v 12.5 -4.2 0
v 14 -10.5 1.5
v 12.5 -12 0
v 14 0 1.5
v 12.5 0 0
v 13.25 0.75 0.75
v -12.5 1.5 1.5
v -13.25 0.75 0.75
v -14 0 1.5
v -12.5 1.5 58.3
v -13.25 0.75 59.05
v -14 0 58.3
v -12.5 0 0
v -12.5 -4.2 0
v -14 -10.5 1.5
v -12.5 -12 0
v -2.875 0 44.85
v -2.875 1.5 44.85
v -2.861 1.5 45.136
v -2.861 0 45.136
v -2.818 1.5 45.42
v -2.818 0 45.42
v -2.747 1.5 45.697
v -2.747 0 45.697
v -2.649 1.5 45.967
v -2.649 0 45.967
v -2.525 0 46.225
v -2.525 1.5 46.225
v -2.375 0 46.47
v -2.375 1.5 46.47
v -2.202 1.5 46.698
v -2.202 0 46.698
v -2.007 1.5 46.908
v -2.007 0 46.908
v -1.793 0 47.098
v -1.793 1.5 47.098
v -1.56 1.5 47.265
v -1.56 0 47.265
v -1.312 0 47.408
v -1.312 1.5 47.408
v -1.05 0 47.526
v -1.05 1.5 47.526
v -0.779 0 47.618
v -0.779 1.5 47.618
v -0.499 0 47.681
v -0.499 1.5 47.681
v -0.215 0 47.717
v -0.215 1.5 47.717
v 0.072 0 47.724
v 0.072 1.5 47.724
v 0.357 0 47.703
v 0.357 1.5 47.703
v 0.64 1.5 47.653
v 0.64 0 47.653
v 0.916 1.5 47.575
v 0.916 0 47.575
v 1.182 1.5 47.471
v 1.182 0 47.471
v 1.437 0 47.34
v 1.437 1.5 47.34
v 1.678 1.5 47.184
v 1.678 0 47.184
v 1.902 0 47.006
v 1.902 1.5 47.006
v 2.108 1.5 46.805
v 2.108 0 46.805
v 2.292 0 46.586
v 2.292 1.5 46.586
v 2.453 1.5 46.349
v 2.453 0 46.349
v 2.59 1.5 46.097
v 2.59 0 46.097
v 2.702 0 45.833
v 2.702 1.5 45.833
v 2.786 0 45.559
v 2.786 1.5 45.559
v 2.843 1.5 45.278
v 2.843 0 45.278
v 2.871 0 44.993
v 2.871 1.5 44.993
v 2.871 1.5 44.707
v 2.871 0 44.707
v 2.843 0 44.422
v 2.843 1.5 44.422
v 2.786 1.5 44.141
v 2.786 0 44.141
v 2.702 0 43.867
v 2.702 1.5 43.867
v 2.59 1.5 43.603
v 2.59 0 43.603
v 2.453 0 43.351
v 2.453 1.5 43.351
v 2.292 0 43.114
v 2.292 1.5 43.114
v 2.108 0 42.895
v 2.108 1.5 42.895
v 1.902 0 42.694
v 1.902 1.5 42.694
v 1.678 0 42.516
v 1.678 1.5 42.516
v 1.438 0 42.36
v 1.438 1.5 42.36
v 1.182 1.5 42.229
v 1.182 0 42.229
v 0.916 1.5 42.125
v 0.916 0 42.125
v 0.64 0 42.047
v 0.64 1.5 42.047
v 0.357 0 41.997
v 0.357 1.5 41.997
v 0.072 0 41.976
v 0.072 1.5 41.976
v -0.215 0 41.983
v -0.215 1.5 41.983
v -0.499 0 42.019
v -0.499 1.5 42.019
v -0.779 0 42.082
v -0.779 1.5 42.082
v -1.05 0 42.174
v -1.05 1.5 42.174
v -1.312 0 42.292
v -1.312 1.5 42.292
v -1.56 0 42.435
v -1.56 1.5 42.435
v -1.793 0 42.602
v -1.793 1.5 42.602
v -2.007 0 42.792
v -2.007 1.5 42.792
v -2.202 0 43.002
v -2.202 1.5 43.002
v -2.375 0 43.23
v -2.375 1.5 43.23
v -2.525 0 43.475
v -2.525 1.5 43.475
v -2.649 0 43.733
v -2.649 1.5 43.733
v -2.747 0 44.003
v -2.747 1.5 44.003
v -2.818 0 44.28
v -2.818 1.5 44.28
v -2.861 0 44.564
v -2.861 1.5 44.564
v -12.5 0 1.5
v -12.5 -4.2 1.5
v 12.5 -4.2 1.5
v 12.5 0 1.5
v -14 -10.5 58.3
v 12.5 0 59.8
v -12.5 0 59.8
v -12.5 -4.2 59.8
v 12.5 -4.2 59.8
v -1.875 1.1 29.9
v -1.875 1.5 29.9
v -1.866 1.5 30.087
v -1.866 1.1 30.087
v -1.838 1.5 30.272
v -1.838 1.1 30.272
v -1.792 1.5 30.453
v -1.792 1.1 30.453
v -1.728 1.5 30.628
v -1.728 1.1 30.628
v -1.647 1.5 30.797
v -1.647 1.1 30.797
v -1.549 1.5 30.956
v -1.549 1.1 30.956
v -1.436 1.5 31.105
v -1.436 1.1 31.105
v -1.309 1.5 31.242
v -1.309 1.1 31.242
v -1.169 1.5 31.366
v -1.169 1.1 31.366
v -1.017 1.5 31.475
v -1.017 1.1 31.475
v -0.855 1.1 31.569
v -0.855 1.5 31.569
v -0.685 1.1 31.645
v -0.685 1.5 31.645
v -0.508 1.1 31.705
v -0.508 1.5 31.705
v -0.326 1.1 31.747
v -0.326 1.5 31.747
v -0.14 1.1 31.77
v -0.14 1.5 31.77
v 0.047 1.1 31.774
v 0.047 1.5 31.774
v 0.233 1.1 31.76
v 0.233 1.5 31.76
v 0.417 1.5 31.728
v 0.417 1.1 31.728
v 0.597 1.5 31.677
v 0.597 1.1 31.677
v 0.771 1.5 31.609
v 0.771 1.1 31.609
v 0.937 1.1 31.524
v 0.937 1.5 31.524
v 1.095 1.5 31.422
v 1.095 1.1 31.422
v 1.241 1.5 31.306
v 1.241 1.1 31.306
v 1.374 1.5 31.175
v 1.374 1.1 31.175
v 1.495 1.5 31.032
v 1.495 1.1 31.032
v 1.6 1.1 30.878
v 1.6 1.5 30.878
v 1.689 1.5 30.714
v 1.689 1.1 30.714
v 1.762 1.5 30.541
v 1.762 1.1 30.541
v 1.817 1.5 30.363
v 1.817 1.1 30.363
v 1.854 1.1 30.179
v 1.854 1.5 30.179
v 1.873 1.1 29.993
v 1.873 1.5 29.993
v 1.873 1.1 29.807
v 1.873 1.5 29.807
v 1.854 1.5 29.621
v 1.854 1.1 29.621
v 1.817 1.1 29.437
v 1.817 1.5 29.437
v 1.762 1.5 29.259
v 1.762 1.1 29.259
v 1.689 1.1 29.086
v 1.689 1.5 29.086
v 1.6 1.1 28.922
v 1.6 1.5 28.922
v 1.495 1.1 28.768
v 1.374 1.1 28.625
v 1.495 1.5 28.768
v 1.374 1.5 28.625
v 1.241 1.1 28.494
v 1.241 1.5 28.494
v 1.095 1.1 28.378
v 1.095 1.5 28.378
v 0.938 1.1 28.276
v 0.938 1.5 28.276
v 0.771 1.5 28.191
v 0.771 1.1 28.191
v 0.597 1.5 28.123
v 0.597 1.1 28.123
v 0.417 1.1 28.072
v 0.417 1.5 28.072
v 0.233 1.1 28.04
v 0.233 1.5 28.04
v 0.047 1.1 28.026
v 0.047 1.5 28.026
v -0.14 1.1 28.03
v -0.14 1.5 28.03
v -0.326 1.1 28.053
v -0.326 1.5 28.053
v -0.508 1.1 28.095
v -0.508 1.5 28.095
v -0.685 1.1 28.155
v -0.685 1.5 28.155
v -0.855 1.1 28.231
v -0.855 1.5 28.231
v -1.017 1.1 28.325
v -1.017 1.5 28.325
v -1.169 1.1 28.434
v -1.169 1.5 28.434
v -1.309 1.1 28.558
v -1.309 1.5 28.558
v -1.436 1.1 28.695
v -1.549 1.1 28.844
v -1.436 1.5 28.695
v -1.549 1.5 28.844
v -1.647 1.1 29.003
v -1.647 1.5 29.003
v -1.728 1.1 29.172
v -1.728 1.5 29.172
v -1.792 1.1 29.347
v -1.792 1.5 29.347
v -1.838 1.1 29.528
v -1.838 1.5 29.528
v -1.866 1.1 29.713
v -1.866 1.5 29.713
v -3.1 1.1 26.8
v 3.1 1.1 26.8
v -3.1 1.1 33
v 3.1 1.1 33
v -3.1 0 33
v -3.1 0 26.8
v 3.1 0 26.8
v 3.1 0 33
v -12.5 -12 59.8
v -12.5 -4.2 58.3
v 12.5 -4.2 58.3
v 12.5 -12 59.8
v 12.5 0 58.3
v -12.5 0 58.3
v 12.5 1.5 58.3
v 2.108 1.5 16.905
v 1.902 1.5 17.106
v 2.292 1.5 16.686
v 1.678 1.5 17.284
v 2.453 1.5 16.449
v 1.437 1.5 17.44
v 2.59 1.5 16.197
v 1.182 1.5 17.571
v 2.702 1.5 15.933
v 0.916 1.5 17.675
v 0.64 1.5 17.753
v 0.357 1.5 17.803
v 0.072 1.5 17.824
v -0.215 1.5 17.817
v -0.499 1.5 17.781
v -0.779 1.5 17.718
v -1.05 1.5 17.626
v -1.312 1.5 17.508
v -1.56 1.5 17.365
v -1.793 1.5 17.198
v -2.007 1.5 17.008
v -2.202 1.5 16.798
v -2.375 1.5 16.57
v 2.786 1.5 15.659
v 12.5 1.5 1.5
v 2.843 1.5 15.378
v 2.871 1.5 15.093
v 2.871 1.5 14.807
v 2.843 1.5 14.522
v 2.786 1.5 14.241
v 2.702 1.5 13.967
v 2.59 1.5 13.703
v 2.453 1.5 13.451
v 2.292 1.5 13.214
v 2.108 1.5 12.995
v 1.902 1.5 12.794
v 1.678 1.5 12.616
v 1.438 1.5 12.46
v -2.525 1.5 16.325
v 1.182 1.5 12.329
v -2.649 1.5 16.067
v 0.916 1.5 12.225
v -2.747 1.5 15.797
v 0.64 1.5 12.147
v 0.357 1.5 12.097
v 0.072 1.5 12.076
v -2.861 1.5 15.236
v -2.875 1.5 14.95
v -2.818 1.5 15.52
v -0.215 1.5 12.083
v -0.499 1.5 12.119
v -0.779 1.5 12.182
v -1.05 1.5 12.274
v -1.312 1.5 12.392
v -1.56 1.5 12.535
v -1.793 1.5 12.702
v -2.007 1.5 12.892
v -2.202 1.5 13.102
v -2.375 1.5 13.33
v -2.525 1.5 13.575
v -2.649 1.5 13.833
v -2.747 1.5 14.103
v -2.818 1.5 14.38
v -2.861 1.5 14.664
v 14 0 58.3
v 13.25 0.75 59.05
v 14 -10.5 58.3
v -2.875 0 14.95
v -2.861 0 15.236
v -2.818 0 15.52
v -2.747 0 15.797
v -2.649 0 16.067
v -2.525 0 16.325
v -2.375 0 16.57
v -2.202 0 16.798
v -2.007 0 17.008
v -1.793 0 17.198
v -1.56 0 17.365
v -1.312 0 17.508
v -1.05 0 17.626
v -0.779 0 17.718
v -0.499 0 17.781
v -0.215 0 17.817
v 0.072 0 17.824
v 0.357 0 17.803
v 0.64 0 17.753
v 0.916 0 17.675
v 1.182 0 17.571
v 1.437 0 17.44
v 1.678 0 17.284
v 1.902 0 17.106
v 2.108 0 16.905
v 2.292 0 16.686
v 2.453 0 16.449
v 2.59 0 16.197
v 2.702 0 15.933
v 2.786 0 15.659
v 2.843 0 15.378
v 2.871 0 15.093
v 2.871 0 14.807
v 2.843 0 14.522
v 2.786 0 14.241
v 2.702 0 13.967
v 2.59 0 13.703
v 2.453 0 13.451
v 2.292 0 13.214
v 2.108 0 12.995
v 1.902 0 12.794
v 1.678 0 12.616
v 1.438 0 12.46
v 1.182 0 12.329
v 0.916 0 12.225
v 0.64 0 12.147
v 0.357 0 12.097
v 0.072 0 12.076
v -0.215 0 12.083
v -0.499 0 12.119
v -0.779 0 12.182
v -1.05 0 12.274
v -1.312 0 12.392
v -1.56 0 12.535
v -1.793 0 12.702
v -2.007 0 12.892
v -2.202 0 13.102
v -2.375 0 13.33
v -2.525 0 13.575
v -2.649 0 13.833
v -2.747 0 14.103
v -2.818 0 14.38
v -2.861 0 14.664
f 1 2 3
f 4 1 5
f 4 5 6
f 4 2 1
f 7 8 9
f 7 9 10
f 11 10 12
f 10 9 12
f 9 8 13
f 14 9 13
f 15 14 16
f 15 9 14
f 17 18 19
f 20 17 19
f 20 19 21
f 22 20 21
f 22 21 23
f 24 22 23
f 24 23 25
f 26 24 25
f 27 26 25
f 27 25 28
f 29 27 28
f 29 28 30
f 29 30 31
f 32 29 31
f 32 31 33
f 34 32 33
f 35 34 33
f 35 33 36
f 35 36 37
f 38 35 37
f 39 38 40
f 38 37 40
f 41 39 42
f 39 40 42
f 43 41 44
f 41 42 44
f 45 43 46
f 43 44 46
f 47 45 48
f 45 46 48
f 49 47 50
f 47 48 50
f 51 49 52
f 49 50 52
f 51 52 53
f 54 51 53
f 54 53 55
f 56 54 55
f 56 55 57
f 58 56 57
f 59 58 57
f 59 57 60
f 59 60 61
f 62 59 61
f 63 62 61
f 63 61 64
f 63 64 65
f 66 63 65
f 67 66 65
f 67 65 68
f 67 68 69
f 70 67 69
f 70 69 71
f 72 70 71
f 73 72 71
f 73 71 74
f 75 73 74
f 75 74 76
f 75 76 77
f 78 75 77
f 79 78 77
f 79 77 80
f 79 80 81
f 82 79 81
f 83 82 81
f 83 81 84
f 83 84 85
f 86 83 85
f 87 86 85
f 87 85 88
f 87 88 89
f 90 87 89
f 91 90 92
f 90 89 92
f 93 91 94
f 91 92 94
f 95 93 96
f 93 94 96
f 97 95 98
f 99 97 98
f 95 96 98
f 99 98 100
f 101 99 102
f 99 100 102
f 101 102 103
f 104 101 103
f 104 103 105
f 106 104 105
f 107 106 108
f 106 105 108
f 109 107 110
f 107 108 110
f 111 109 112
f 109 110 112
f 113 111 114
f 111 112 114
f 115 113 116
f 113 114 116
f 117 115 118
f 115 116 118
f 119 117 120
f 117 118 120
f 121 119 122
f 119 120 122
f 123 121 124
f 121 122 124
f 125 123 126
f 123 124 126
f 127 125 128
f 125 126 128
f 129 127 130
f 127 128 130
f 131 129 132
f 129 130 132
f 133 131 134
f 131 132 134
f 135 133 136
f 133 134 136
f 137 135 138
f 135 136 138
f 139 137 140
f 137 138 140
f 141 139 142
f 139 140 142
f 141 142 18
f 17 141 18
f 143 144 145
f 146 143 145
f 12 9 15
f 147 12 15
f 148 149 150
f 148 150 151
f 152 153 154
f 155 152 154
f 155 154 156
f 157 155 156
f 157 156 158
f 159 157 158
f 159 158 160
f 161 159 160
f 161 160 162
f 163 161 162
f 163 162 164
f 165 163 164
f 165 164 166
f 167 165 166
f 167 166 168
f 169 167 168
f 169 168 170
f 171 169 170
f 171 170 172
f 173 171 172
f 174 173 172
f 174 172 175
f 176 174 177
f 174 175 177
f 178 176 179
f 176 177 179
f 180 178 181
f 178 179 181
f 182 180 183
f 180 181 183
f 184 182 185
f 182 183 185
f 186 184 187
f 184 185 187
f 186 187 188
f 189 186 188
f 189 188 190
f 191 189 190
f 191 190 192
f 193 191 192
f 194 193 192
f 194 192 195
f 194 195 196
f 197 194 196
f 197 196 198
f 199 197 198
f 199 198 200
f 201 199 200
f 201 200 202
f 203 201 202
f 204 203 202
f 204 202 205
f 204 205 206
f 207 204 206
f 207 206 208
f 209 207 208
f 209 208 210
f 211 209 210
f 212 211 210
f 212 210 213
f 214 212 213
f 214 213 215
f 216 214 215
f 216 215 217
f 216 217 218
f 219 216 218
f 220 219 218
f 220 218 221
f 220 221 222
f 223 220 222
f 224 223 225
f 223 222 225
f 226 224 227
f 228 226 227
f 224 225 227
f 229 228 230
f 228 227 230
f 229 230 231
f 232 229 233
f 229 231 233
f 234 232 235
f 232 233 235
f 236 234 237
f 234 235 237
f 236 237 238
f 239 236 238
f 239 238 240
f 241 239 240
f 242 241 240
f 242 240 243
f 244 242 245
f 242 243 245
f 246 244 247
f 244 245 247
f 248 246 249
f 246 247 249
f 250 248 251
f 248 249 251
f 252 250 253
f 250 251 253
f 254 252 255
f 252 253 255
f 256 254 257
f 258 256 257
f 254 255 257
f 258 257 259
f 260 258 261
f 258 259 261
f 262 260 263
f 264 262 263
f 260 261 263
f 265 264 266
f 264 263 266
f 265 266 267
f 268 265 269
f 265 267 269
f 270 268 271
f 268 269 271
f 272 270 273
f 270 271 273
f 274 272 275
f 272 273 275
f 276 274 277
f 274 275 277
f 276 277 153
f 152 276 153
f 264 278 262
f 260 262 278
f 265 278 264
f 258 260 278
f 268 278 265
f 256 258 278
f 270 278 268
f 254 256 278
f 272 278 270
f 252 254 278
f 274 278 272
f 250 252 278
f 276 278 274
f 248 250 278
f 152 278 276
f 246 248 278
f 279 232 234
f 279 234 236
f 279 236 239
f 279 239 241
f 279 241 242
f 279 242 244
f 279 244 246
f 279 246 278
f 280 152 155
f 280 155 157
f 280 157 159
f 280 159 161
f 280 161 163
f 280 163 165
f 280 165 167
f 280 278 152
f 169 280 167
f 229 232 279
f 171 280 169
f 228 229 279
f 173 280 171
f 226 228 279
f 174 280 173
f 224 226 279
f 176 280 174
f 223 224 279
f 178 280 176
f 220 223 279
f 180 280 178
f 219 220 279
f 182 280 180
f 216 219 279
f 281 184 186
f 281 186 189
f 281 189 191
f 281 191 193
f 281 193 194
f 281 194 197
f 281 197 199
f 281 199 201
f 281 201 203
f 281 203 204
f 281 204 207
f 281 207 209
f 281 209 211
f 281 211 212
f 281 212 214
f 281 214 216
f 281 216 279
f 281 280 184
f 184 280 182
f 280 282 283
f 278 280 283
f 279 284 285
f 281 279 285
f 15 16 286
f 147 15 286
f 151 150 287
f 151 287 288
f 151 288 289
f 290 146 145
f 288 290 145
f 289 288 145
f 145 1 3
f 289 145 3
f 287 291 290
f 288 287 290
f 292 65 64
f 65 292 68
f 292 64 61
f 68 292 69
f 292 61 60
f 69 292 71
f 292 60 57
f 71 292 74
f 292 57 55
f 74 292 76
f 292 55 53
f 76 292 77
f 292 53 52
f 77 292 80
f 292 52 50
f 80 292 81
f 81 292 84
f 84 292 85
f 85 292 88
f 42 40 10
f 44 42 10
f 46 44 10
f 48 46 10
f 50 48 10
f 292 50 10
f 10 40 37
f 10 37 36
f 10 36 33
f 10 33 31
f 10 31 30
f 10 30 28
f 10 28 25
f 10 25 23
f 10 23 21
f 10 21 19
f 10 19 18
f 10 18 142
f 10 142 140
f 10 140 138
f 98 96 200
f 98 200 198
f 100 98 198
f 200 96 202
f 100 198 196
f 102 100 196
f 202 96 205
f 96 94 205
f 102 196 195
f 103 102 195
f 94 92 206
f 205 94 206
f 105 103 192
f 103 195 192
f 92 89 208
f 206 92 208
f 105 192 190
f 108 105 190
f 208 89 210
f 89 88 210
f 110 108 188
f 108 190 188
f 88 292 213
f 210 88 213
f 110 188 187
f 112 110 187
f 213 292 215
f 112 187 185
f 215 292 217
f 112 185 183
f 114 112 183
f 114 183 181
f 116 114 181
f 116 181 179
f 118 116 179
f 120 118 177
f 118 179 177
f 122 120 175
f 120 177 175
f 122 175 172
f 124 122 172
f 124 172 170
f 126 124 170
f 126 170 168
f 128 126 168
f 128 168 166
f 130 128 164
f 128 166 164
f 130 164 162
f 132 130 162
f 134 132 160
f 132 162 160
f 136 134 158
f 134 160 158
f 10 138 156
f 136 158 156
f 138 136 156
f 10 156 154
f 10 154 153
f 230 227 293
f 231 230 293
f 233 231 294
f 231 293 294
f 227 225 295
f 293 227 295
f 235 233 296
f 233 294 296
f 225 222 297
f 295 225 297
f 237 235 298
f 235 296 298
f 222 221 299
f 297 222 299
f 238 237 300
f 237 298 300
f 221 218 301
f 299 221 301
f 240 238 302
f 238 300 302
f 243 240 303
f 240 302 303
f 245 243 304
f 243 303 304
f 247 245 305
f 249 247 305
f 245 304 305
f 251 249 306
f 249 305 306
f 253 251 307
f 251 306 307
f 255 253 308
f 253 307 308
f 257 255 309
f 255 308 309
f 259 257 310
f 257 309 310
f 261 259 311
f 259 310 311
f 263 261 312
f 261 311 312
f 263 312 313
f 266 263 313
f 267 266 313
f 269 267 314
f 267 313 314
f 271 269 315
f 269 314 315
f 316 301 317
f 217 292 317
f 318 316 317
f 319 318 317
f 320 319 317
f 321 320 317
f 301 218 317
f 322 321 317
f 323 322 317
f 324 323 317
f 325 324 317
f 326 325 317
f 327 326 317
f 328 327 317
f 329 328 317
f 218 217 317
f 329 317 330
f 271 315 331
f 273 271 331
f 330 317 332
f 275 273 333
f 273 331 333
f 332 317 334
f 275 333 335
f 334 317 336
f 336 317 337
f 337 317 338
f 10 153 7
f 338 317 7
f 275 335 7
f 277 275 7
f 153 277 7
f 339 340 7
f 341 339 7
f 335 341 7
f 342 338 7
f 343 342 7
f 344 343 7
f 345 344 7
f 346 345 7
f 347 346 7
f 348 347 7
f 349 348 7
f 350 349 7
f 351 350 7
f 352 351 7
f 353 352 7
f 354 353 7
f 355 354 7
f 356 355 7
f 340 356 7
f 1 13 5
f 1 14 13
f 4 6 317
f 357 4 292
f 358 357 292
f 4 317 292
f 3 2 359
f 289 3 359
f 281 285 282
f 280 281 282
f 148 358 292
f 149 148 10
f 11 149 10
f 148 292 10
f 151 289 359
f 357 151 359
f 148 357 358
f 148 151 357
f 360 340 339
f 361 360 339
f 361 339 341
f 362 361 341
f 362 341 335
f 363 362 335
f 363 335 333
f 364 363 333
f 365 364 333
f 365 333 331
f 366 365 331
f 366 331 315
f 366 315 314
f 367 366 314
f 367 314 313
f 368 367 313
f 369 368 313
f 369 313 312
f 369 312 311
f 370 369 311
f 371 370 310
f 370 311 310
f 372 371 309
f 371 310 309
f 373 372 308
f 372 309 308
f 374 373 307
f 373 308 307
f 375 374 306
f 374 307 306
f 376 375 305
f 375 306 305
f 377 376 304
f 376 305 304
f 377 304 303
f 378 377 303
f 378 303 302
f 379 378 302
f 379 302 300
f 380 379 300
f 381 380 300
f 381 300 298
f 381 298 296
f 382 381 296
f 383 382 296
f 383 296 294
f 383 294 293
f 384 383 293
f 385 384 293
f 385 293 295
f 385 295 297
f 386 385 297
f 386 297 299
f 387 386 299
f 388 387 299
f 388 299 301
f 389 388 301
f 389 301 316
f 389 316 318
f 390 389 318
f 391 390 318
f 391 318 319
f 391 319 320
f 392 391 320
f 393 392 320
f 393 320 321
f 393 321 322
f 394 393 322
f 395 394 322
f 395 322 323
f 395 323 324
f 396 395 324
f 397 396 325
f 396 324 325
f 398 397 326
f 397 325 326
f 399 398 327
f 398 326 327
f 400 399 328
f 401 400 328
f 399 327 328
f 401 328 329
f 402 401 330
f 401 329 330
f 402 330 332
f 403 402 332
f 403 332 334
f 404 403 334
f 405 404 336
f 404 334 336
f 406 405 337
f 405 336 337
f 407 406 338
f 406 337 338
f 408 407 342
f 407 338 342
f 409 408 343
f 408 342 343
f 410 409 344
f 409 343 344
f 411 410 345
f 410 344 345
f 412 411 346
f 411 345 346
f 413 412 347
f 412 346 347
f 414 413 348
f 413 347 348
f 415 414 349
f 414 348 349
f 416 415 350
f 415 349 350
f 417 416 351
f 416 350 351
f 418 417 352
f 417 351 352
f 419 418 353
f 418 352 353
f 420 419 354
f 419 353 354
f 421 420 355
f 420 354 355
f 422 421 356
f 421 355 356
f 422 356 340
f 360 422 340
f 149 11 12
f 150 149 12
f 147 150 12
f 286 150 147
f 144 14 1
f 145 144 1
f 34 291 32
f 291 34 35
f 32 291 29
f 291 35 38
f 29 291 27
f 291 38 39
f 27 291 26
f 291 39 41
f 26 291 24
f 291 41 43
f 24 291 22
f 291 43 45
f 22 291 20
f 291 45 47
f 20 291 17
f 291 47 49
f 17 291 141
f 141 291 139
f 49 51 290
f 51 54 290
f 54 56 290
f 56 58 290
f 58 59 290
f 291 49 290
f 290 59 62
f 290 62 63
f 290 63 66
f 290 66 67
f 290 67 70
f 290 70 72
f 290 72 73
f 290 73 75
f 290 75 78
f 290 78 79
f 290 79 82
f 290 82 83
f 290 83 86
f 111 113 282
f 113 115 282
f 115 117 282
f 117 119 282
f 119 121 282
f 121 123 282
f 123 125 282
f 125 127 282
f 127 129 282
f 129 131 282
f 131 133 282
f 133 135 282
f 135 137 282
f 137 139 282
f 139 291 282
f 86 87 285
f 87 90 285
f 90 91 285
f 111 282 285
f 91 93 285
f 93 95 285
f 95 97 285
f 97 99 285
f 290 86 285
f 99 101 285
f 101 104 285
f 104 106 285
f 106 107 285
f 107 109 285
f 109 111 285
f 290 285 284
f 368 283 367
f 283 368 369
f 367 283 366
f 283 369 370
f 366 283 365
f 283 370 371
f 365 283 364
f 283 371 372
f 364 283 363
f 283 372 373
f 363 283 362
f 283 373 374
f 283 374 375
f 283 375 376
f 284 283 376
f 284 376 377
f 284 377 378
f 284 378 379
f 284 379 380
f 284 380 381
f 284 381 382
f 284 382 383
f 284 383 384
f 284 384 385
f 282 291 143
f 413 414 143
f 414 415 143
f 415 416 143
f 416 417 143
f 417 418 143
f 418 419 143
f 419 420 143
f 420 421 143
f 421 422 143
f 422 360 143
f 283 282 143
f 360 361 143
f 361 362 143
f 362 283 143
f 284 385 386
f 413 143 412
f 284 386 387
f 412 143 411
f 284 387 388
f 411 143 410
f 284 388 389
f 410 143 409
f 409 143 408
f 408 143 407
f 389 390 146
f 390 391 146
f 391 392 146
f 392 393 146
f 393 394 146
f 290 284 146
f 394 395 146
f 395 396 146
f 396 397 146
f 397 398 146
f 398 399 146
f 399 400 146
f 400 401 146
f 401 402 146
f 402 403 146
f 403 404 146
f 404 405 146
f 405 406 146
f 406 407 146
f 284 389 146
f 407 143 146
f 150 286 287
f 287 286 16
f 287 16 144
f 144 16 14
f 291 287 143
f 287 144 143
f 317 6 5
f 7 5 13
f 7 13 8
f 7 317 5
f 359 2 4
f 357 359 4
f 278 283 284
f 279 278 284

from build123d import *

# Parameters (mm, degrees)
F1_DEPTH  = 59.8
F2_R      = 2.875
F2_R_2    = 1.875
F3_DEPTH  = 25
F4_W      = 25
F4_H      = 4.2
F5_DEPTH  = 1.5
F6_W      = 25
F6_H      = 4.2
F7_DEPTH  = 1.5
F8_SIZE   = 1.5
F9_SIZE   = 1.5
F11_DEPTH = 1.1
F12_SIZE  = 1.49999


# Not quite as in the source:
# - a fillet or chamfer is up to 0.001 mm smaller than in the source, because OpenCascade refuses the exact size


with BuildPart() as f1:
    # F0 (on Top) → F1 (new body)
    with BuildSketch(Plane.XY):
        Polygon((-12.5, 0), (0, 0), (0, 1.5), (-12.5, 1.5), (-14, 1.5), (-14, 0), (-14, -12), (-12.5, -12), align=None)
        Polygon((0, 1.5), (0, 0), (12.5, 0), (12.5, -12), (14, -12), (14, 0), (14, 1.5), (12.5, 1.5), align=None)
    extrude(amount=F1_DEPTH)

    # F2 (on face) → F3 (cut)
    with BuildSketch(Plane(origin=(0, 1.5, 0), x_dir=(-1, 0, 0), z_dir=(0, 1, 0))):
        with Locations((0, 44.85)):
            Circle(F2_R)
        with Locations((0, 29.9)):
            Circle(F2_R_2)
        with Locations((0, 14.95)):
            Circle(F2_R)
    extrude(amount=-F3_DEPTH, mode=Mode.SUBTRACT)

    # F4 (on face) → F5 (join)
    with BuildSketch(Plane.XY.offset(59.8)):
        with Locations((0, -2.1)):
            Rectangle(F4_W, F4_H)
    extrude(amount=-F5_DEPTH)

    # F6 (on face) → F7 (join)
    with BuildSketch(Plane(origin=(0, 0, 0), x_dir=(1, 0, 0), z_dir=(0, 0, -1))):
        with Locations((0, 2.1)):
            Rectangle(F6_W, F6_H)
    extrude(amount=-F7_DEPTH)

    # F8
    f8_edges = [f1.edges().sort_by_distance(p)[0] for p in [
        (14, 1.5, 29.9),
        (-14, 1.5, 29.9),
        (0, 1.5, 0),
        (0, 1.5, 59.8),
    ]]
    chamfer(f8_edges, length=F8_SIZE)

    # F9
    f9_edges = [f1.edges().sort_by_distance(p)[0] for p in [
        (-14, -6, 0),
        (14, -6, 0),
        (-14, -6, 59.8),
        (14, -6, 59.8),
    ]]
    chamfer(f9_edges, length=F9_SIZE)

    # F10 (on face) → F11 (cut)
    with BuildSketch(Plane.XZ):
        Polygon((3.1, 33), (0, 33), (-3.1, 33), (-3.1, 26.8), (0, 26.8), (3.1, 26.8), (3.1, 29.9), align=None)
    extrude(amount=-F11_DEPTH, mode=Mode.SUBTRACT)

    # F12 (size 1.5 in the source; OpenCascade refuses exactly that, so slightly less here)
    f12_edges = [f1.edges().sort_by_distance(p)[0] for p in [
        (-14, -12, 29.9),
        (14, -12, 29.9),
    ]]
    chamfer(f12_edges, length=F12_SIZE)


solid = f1.part
